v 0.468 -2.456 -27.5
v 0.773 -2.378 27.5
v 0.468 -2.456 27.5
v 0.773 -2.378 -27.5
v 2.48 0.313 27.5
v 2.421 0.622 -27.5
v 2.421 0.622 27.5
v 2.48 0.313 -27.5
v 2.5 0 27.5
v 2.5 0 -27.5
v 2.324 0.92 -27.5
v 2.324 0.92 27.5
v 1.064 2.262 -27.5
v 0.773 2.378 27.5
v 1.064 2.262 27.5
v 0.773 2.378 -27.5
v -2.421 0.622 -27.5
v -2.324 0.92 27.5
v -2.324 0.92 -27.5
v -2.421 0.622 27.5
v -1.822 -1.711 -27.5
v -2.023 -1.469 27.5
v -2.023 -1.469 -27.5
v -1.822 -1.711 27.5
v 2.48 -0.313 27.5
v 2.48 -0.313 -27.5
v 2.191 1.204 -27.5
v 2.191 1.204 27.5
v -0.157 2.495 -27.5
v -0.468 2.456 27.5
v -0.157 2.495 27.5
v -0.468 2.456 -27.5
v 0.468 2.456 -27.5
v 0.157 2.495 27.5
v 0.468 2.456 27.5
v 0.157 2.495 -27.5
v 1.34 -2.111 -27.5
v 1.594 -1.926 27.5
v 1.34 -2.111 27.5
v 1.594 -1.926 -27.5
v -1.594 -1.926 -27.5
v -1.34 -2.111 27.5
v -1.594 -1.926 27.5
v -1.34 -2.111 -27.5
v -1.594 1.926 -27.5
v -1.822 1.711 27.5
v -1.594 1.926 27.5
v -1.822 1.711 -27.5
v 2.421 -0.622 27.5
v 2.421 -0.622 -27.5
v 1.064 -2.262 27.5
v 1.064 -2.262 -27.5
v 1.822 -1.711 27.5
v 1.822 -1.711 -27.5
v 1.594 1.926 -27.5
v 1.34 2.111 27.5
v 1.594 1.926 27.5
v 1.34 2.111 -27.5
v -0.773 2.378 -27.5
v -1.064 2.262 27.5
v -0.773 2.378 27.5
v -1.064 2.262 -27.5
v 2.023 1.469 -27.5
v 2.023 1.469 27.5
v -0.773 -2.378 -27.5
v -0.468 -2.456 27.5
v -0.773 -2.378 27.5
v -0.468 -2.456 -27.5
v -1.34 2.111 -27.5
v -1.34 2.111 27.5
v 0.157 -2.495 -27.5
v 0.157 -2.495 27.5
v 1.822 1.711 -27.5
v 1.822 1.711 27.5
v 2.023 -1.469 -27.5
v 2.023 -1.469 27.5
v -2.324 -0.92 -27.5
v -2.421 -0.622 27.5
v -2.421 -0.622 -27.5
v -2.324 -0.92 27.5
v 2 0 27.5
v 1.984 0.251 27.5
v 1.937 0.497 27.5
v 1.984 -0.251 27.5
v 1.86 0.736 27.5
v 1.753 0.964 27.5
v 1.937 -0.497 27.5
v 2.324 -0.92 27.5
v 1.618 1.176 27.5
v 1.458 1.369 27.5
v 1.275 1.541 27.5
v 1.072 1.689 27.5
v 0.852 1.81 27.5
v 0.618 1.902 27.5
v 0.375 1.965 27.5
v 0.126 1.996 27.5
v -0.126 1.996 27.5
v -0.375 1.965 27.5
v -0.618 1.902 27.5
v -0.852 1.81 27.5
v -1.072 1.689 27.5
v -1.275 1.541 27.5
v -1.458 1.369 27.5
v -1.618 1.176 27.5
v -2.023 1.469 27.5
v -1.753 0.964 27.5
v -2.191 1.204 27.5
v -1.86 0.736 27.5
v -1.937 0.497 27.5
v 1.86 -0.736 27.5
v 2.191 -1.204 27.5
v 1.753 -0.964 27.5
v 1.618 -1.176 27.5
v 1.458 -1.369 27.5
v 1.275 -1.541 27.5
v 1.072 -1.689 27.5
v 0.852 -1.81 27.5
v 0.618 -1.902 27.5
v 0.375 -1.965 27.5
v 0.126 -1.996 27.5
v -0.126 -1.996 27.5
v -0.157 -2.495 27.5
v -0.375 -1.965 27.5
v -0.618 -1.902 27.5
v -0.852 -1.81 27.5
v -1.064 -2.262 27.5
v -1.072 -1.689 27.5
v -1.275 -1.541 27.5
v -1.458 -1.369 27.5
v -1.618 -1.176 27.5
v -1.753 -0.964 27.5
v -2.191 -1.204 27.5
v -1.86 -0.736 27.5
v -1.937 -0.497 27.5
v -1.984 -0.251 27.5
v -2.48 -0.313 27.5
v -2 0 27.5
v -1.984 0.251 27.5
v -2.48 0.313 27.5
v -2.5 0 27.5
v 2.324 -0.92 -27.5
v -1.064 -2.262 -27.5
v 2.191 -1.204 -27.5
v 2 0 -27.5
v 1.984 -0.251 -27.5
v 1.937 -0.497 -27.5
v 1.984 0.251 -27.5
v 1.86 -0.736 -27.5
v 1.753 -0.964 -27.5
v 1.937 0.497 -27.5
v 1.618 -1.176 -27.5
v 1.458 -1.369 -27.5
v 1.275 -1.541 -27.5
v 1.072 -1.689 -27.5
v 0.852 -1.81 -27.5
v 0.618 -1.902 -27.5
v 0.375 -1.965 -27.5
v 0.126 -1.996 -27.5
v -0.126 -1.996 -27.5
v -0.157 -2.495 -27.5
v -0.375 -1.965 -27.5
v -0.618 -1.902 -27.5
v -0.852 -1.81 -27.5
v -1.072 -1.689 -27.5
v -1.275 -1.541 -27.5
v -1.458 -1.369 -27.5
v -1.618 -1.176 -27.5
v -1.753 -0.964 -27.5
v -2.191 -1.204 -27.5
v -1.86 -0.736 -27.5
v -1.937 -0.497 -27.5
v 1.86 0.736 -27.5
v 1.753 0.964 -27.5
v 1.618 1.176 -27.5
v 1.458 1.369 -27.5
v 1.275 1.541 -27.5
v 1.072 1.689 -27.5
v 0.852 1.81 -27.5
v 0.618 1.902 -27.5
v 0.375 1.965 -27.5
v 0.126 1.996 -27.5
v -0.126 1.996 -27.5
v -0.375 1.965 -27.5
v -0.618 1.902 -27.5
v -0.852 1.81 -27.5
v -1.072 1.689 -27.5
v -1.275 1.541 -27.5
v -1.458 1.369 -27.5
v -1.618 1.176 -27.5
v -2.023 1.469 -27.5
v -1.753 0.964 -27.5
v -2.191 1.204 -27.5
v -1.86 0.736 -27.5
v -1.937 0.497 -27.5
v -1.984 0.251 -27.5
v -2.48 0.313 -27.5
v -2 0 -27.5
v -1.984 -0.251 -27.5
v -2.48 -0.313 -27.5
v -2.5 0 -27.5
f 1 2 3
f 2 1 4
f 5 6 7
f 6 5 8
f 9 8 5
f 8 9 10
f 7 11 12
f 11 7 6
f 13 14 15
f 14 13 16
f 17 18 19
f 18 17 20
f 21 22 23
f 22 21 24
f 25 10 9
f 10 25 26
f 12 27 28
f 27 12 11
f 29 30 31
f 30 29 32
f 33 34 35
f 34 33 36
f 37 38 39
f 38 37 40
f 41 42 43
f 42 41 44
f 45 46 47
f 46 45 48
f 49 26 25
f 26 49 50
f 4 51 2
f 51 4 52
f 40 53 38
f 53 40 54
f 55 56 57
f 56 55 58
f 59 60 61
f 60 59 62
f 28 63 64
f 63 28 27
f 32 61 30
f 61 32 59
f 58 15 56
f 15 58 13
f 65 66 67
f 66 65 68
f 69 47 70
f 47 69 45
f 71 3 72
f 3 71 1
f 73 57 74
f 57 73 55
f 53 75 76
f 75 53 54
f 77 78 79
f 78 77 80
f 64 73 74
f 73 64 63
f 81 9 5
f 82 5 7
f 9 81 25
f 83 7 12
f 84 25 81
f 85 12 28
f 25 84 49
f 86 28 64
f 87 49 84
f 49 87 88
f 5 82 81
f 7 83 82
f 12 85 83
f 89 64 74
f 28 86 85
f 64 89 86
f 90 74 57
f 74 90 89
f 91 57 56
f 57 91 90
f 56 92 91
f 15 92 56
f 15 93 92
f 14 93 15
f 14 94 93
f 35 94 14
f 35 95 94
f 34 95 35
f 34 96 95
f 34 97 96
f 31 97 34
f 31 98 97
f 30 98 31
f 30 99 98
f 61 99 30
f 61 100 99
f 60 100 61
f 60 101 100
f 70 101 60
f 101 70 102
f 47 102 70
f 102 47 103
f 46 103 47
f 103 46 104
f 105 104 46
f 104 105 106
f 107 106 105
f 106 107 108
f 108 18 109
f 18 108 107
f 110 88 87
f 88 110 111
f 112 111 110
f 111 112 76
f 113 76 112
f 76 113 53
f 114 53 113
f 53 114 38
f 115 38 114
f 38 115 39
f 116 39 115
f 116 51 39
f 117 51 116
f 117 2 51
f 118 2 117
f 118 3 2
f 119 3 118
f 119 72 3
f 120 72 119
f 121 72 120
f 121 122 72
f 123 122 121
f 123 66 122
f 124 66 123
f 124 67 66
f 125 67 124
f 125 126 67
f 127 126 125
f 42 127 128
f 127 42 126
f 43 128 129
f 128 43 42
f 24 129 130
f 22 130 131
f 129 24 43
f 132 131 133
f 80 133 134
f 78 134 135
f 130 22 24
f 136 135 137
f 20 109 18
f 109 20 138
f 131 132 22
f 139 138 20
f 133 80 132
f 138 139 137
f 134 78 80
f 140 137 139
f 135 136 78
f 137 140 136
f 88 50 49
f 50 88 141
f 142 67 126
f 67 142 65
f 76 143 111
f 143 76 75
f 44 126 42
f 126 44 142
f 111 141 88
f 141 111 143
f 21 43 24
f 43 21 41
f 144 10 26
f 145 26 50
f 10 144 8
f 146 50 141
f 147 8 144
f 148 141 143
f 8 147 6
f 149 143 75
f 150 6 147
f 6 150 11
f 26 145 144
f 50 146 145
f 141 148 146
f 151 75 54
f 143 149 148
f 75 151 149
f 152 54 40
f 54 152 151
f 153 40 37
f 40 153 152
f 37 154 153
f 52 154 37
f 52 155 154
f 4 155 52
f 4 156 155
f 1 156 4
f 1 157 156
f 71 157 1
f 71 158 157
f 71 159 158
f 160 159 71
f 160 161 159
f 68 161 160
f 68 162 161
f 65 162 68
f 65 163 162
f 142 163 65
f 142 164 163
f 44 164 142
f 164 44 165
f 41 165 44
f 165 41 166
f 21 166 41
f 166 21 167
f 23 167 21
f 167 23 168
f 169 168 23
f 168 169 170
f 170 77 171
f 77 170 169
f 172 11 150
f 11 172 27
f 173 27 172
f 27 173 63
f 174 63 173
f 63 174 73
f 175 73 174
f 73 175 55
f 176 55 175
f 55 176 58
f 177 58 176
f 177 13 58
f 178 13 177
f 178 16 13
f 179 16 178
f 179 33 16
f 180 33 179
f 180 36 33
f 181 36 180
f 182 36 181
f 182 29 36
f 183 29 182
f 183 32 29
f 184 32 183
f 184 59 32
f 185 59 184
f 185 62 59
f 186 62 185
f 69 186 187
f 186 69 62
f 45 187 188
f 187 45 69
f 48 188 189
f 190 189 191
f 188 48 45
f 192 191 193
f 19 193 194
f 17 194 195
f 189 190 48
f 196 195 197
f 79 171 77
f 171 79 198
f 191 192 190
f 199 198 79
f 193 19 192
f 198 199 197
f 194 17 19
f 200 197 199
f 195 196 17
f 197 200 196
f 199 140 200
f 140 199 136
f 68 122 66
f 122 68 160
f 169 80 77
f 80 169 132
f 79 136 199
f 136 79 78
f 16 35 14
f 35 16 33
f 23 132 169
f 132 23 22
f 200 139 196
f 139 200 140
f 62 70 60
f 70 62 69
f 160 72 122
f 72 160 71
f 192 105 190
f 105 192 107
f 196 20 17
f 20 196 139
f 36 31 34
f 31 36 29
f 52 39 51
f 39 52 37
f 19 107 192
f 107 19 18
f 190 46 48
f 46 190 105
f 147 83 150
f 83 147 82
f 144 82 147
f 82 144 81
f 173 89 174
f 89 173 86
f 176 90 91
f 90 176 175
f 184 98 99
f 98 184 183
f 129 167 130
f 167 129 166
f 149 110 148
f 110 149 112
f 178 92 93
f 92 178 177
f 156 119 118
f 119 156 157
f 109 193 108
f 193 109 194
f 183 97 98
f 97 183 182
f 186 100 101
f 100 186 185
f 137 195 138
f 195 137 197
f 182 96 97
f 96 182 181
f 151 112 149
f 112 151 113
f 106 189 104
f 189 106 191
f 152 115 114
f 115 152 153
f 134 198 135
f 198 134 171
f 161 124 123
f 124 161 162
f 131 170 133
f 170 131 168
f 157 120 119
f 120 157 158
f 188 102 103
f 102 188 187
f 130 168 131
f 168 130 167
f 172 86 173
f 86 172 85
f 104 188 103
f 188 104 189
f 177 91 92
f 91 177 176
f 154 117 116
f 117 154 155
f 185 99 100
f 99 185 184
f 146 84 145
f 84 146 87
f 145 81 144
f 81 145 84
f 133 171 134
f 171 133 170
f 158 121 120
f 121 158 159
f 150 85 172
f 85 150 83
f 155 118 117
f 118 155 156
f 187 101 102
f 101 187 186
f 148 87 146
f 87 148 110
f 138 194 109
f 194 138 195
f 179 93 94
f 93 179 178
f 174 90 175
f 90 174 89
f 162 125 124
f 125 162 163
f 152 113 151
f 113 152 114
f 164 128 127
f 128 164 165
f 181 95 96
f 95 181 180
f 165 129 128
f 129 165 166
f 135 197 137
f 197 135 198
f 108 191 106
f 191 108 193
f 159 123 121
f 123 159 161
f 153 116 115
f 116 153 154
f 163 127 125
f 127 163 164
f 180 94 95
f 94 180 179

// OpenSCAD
$fn = 50;


difference() {
	union() {
		translate(v = [0, 0, -27.5000000000]) {
			cylinder(h = 55, r = 2.5000000000);
		}
	}
	union() {
		translate(v = [0, 0, -100.0000000000]) {
			cylinder(h = 200, r = 2.0000000000);
		}
	}
}
